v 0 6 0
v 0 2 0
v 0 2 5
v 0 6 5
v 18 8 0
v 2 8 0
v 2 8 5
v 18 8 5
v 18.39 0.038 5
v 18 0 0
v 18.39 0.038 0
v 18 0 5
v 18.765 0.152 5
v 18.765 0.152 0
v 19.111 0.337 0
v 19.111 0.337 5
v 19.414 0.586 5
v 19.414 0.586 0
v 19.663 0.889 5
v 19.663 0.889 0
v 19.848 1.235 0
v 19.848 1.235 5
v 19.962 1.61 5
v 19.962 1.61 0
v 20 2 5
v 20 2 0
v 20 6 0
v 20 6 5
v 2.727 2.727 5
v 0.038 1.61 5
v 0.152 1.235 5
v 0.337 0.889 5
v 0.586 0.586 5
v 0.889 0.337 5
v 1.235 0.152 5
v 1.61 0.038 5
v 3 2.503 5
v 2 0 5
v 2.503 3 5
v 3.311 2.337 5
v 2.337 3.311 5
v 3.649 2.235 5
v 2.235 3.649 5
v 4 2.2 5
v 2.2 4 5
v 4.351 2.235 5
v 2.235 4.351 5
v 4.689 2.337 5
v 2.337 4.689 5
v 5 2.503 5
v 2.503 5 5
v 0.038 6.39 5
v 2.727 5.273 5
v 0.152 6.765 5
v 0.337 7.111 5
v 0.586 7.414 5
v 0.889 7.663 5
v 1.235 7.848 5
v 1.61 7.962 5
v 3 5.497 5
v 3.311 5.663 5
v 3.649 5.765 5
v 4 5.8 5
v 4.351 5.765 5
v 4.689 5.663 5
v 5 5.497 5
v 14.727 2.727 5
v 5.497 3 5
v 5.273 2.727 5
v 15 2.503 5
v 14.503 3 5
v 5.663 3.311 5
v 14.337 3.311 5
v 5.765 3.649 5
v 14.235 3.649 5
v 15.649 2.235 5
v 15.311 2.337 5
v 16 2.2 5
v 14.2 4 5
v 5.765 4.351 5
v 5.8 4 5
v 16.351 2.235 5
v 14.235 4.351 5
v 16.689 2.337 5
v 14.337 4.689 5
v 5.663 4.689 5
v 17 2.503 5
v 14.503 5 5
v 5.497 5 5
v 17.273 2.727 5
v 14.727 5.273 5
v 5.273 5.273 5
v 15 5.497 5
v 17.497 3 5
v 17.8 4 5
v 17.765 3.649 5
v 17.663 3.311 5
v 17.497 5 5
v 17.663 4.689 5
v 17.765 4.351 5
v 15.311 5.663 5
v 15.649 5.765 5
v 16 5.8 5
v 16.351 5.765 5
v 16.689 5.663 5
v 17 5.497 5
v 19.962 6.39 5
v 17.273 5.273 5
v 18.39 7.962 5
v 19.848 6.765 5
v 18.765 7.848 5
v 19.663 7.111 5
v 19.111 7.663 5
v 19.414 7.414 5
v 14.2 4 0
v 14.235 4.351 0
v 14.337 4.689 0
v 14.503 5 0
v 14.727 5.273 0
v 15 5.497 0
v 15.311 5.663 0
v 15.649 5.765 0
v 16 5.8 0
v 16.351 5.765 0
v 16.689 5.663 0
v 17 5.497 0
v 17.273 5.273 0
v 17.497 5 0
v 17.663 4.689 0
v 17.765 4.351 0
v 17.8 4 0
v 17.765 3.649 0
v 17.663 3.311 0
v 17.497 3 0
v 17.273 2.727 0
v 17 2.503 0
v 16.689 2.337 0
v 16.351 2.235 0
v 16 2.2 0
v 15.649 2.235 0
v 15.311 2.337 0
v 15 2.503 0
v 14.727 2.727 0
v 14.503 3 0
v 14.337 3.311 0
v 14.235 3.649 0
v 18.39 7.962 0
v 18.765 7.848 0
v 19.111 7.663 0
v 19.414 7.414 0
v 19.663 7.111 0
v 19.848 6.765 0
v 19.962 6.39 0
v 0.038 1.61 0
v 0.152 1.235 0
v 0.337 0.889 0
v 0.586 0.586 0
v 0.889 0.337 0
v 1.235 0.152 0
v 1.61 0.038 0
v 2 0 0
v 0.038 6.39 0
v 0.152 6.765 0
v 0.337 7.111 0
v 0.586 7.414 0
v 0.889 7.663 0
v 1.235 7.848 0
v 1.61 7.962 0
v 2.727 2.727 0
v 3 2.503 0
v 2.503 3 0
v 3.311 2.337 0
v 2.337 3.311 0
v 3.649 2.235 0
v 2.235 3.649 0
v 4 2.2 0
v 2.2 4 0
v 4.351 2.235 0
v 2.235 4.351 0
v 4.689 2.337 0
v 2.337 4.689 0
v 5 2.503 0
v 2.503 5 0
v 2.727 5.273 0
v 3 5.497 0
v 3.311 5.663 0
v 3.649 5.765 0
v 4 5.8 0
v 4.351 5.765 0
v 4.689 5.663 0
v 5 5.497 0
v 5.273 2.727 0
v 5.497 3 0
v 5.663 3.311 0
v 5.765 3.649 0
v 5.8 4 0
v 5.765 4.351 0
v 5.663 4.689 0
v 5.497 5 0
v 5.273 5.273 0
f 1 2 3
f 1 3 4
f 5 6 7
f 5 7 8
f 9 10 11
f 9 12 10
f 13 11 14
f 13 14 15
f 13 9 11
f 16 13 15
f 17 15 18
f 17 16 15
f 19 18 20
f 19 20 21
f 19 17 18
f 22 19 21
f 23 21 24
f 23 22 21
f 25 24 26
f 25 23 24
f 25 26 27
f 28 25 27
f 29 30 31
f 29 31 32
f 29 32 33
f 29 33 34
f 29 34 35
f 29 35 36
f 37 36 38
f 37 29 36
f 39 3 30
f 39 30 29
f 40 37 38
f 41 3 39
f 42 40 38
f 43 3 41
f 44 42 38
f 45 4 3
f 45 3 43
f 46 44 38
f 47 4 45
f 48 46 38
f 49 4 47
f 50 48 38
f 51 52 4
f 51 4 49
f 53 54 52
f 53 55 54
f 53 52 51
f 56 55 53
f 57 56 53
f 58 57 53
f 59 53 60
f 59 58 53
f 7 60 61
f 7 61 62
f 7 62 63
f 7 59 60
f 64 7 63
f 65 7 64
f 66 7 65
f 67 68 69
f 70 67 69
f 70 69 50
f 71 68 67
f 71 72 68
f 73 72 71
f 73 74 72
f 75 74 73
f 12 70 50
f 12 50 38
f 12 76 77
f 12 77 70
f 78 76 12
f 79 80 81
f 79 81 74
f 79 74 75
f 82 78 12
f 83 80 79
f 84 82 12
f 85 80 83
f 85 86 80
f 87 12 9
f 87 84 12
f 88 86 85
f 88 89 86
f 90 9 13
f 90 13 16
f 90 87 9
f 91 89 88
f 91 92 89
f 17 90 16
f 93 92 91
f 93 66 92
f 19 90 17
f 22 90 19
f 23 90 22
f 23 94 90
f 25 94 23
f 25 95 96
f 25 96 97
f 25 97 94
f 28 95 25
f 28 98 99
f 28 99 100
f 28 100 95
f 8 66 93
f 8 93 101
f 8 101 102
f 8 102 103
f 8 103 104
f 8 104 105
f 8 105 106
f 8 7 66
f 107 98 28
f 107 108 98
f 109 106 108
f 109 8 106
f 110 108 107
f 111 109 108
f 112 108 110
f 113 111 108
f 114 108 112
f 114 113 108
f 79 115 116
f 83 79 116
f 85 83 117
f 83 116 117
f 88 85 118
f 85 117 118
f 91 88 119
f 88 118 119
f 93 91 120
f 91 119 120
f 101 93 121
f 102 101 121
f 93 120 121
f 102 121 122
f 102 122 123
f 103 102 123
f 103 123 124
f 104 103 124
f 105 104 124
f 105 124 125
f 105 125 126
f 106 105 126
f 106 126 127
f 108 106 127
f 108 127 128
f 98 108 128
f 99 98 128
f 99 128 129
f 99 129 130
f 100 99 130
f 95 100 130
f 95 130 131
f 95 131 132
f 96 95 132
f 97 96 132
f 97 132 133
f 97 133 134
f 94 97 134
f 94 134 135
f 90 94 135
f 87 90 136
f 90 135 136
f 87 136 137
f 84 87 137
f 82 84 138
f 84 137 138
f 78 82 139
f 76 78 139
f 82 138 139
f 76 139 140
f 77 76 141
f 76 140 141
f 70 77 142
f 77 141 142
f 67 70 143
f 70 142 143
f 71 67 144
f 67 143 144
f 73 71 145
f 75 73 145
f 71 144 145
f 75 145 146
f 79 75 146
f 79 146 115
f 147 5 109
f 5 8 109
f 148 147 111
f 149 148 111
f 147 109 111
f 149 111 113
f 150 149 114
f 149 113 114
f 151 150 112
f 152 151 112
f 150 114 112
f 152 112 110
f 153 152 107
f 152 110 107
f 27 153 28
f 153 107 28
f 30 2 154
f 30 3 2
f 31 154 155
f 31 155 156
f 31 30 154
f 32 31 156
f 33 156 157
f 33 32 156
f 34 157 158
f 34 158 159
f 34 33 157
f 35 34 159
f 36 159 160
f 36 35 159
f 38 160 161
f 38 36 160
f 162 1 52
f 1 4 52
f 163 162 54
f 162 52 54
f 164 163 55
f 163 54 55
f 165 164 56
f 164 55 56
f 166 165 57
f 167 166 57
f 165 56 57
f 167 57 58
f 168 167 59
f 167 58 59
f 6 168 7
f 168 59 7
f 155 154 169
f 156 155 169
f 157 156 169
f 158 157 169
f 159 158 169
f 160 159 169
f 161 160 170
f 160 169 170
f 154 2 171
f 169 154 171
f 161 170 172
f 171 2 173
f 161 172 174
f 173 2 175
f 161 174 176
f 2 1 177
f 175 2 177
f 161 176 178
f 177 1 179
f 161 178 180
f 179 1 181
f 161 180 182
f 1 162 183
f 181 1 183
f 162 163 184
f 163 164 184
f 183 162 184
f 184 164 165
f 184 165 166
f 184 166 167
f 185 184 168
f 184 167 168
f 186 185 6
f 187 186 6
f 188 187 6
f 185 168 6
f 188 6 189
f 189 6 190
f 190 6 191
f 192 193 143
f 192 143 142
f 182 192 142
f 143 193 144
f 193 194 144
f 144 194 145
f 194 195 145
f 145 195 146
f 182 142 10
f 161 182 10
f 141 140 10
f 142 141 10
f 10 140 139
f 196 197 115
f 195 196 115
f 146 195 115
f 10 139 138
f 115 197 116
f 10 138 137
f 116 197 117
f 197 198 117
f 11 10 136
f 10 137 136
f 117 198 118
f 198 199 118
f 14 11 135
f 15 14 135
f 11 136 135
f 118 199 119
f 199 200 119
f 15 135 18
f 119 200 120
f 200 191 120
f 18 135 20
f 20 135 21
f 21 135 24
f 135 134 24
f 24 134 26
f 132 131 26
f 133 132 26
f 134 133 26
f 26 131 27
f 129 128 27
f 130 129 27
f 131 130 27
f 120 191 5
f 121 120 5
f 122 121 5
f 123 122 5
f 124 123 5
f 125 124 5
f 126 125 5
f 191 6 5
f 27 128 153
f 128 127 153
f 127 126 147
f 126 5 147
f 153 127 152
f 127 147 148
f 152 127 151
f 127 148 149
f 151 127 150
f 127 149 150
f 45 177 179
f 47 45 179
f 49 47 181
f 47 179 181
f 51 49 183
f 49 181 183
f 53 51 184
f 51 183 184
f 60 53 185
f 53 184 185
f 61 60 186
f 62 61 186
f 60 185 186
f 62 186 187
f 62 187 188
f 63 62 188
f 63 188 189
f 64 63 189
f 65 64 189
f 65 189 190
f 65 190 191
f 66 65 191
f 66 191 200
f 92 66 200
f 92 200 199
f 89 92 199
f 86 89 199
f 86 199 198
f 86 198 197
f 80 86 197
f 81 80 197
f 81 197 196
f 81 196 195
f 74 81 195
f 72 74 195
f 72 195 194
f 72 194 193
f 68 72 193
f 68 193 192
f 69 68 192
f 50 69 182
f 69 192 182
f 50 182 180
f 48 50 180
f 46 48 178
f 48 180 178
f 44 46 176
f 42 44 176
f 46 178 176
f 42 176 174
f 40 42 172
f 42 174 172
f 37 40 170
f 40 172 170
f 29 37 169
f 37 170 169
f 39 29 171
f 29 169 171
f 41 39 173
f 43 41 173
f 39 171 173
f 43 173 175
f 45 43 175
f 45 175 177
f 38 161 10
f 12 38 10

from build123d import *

# Parameters (mm, degrees)
SKETCH2_W            = 20
SKETCH2_H            = 8
BOSS_EXTRUDE1_DEPTH  = 5
M3_CLEARANCE_HOLE1_D = 3.6
FILLET1_R            = 2


with BuildPart() as part:
    # Sketch2 → Boss-Extrude1 (new body)
    with BuildSketch(Plane.XY):
        with Locations((10, 4)):
            Rectangle(SKETCH2_W, SKETCH2_H)
    extrude(amount=BOSS_EXTRUDE1_DEPTH)

    # M3 Clearance Hole1 (through all)
    with Locations(Plane.XY.offset(5)):
        with Locations((4, 4), (16, 4)):
            Hole(M3_CLEARANCE_HOLE1_D / 2)

    # Fillet1
    fillet1_edges = [part.edges().sort_by_distance(p)[0] for p in [
        (0, 8, 2.5),
        (20, 8, 2.5),
        (20, 0, 2.5),
        (0, 0, 2.5),
    ]]
    fillet(fillet1_edges, radius=FILLET1_R)


solid = part.part
